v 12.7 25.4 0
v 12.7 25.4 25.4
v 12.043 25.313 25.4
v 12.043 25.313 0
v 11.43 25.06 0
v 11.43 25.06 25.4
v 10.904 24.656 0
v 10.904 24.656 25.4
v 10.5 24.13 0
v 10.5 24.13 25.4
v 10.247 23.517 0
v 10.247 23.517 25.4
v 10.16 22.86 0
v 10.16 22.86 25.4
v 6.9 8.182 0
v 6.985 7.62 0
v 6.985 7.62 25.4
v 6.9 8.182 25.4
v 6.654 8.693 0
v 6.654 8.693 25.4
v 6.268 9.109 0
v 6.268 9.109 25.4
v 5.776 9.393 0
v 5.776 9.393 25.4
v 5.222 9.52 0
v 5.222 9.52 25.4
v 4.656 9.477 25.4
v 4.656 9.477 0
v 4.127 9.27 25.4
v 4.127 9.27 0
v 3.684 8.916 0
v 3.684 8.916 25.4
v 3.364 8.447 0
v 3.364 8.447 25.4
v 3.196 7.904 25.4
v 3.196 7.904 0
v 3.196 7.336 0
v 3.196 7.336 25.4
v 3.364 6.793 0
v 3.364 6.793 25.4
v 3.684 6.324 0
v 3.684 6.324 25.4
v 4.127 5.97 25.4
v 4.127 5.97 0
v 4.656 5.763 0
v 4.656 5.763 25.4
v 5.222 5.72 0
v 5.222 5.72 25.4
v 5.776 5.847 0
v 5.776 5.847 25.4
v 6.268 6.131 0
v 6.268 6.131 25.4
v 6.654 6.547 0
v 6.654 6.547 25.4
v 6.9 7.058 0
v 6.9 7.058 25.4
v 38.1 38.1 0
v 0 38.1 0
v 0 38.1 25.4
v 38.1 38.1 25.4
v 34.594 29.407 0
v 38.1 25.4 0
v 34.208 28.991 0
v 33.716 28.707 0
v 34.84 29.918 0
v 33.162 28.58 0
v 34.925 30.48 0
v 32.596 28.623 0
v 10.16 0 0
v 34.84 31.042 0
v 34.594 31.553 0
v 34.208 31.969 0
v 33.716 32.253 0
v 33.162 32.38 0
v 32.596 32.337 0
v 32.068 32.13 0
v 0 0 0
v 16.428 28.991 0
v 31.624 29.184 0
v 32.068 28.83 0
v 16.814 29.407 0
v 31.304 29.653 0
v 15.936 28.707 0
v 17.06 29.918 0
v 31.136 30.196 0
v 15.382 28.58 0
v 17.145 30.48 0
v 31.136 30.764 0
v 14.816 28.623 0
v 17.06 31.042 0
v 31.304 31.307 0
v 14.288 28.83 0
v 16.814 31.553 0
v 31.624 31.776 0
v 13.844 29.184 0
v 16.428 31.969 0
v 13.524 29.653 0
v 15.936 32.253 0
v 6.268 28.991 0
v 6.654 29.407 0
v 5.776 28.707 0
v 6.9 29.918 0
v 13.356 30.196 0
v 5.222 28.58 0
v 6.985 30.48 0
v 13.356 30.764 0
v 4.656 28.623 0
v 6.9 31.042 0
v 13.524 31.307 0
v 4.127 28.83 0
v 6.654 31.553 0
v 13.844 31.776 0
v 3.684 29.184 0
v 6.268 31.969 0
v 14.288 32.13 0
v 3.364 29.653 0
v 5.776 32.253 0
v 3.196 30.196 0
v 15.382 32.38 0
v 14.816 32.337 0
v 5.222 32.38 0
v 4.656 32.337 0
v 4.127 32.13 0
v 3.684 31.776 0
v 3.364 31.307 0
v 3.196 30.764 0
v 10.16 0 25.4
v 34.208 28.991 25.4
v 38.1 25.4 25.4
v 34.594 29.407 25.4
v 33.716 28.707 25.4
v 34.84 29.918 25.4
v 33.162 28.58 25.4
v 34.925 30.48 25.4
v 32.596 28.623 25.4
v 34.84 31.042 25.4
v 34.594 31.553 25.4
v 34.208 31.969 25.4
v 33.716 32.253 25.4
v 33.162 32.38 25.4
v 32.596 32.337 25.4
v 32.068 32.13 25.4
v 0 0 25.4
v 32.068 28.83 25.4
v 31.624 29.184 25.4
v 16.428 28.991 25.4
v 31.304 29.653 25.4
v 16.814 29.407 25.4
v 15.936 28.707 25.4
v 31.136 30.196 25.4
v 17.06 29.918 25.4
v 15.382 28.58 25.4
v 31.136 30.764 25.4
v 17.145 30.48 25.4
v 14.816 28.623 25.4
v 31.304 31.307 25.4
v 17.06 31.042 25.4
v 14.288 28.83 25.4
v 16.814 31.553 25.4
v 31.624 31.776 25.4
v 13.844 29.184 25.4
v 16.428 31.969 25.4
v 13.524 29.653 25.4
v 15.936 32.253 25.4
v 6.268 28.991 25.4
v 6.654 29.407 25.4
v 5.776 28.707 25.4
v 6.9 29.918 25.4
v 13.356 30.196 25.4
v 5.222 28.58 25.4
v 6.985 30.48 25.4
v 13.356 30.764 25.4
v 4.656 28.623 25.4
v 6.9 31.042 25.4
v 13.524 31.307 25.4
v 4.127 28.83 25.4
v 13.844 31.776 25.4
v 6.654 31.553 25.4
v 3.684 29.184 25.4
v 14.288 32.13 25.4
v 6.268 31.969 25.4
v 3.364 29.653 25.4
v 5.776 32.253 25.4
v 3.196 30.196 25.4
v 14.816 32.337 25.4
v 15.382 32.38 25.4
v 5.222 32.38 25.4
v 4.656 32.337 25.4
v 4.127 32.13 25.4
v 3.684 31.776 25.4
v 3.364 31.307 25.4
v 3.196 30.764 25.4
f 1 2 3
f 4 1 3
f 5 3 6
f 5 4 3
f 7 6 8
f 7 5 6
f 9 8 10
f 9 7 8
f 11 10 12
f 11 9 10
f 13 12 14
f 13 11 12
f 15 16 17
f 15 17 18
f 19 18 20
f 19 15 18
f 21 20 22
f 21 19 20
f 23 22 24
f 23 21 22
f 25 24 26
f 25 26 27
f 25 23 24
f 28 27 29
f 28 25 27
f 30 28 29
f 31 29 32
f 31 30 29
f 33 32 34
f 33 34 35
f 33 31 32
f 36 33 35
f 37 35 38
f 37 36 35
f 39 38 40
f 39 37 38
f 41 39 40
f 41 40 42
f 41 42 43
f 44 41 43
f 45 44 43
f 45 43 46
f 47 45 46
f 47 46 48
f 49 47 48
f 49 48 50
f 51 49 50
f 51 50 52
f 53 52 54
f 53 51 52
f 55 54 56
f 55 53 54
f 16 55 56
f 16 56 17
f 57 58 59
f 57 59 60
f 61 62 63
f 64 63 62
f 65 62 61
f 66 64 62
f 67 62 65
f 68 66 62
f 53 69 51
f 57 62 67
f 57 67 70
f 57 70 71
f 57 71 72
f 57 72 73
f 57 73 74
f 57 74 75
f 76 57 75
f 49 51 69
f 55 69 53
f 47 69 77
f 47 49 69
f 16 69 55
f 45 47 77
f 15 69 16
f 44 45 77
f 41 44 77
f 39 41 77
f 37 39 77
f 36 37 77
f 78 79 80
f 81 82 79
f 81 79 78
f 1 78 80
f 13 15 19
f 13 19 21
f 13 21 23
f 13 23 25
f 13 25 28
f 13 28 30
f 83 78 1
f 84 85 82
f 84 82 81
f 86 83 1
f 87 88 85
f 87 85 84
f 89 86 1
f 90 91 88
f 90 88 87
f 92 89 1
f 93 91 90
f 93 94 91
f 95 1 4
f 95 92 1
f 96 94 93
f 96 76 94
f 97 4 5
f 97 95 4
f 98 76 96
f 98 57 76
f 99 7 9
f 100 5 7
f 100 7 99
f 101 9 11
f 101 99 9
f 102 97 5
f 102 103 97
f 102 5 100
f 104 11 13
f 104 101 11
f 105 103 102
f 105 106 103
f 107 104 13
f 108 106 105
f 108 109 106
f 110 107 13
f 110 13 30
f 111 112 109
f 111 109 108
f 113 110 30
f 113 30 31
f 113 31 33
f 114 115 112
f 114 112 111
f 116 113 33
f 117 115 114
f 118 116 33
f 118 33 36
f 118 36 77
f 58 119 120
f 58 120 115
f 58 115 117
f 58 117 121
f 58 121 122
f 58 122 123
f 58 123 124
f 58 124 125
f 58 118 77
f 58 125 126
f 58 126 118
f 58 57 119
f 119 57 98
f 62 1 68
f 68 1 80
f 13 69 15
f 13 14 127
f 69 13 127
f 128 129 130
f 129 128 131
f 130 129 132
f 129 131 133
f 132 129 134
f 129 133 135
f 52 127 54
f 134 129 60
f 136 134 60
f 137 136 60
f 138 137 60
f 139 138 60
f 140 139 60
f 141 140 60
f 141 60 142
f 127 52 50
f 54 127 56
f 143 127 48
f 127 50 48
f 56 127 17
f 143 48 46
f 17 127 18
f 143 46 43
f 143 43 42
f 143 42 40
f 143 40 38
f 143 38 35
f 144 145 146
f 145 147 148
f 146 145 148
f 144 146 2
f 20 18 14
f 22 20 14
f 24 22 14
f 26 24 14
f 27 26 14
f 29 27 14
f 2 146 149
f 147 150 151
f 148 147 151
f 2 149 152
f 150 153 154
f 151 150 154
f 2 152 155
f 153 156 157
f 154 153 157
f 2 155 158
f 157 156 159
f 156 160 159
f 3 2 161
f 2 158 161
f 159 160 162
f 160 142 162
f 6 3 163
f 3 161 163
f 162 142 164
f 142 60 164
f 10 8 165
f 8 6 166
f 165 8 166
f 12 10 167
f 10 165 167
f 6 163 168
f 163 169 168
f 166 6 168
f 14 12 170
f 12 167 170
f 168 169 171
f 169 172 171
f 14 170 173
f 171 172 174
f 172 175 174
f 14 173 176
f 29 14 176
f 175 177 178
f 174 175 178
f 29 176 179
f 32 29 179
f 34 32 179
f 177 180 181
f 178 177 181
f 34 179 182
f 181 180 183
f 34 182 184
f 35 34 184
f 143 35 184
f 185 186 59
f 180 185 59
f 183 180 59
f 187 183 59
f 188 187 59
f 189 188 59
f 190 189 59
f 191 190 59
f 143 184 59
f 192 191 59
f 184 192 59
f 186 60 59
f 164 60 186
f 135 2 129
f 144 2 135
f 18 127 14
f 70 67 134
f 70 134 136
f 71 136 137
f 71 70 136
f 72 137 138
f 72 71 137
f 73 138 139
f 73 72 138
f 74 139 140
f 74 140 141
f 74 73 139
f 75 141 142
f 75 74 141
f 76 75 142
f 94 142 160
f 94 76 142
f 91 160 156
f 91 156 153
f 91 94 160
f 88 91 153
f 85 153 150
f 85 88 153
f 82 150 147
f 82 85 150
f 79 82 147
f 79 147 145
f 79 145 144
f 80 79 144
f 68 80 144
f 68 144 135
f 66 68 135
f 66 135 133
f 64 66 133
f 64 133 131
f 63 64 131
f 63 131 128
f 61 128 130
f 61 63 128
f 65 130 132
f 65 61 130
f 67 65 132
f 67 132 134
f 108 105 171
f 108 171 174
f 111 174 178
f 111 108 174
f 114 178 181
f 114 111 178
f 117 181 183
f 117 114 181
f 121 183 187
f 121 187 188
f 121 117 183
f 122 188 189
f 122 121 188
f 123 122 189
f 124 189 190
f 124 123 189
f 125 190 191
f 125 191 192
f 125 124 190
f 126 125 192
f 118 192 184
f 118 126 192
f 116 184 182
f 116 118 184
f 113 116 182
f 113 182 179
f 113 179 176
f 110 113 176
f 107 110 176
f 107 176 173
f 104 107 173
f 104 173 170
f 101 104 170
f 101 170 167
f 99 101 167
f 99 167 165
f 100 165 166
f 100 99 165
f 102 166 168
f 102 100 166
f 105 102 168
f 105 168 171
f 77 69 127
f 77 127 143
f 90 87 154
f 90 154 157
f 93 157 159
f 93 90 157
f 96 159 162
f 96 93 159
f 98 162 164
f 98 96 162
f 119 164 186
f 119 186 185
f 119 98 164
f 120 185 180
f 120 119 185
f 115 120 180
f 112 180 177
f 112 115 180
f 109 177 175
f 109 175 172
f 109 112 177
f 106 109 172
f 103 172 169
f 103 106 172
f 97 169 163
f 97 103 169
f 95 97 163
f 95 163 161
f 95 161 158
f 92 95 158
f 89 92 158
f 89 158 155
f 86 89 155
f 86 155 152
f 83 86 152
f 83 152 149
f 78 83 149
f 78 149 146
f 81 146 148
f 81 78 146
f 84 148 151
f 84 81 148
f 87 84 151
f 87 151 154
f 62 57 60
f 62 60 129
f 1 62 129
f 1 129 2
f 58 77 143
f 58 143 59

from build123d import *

# Parameters (mm, degrees)
SKETCH1_R           = 1.905
BOSS_EXTRUDE1_DEPTH = 25.4


with BuildPart() as part:
    # Sketch1 → Boss-Extrude1 (new body)
    with BuildSketch(Plane.XY):
        with BuildLine():
            Line((0, 0), (0, 38.1))
            Line((0, 38.1), (38.1, 38.1))
            Line((38.1, 38.1), (38.1, 25.4))
            Line((38.1, 25.4), (12.7, 25.4))
            ThreePointArc((12.7, 25.4), (10.903948776, 24.656051224), (10.16, 22.86))
            Line((10.16, 22.86), (10.16, 0))
            Line((10.16, 0), (0, 0))
        make_face()
        with Locations((5.08, 30.48)):
            Circle(SKETCH1_R, mode=Mode.SUBTRACT)
        with Locations((5.08, 7.62)):
            Circle(SKETCH1_R, mode=Mode.SUBTRACT)
        with Locations((15.24, 30.48)):
            Circle(SKETCH1_R, mode=Mode.SUBTRACT)
        with Locations((33.02, 30.48)):
            Circle(SKETCH1_R, mode=Mode.SUBTRACT)
    extrude(amount=BOSS_EXTRUDE1_DEPTH)


solid = part.part
